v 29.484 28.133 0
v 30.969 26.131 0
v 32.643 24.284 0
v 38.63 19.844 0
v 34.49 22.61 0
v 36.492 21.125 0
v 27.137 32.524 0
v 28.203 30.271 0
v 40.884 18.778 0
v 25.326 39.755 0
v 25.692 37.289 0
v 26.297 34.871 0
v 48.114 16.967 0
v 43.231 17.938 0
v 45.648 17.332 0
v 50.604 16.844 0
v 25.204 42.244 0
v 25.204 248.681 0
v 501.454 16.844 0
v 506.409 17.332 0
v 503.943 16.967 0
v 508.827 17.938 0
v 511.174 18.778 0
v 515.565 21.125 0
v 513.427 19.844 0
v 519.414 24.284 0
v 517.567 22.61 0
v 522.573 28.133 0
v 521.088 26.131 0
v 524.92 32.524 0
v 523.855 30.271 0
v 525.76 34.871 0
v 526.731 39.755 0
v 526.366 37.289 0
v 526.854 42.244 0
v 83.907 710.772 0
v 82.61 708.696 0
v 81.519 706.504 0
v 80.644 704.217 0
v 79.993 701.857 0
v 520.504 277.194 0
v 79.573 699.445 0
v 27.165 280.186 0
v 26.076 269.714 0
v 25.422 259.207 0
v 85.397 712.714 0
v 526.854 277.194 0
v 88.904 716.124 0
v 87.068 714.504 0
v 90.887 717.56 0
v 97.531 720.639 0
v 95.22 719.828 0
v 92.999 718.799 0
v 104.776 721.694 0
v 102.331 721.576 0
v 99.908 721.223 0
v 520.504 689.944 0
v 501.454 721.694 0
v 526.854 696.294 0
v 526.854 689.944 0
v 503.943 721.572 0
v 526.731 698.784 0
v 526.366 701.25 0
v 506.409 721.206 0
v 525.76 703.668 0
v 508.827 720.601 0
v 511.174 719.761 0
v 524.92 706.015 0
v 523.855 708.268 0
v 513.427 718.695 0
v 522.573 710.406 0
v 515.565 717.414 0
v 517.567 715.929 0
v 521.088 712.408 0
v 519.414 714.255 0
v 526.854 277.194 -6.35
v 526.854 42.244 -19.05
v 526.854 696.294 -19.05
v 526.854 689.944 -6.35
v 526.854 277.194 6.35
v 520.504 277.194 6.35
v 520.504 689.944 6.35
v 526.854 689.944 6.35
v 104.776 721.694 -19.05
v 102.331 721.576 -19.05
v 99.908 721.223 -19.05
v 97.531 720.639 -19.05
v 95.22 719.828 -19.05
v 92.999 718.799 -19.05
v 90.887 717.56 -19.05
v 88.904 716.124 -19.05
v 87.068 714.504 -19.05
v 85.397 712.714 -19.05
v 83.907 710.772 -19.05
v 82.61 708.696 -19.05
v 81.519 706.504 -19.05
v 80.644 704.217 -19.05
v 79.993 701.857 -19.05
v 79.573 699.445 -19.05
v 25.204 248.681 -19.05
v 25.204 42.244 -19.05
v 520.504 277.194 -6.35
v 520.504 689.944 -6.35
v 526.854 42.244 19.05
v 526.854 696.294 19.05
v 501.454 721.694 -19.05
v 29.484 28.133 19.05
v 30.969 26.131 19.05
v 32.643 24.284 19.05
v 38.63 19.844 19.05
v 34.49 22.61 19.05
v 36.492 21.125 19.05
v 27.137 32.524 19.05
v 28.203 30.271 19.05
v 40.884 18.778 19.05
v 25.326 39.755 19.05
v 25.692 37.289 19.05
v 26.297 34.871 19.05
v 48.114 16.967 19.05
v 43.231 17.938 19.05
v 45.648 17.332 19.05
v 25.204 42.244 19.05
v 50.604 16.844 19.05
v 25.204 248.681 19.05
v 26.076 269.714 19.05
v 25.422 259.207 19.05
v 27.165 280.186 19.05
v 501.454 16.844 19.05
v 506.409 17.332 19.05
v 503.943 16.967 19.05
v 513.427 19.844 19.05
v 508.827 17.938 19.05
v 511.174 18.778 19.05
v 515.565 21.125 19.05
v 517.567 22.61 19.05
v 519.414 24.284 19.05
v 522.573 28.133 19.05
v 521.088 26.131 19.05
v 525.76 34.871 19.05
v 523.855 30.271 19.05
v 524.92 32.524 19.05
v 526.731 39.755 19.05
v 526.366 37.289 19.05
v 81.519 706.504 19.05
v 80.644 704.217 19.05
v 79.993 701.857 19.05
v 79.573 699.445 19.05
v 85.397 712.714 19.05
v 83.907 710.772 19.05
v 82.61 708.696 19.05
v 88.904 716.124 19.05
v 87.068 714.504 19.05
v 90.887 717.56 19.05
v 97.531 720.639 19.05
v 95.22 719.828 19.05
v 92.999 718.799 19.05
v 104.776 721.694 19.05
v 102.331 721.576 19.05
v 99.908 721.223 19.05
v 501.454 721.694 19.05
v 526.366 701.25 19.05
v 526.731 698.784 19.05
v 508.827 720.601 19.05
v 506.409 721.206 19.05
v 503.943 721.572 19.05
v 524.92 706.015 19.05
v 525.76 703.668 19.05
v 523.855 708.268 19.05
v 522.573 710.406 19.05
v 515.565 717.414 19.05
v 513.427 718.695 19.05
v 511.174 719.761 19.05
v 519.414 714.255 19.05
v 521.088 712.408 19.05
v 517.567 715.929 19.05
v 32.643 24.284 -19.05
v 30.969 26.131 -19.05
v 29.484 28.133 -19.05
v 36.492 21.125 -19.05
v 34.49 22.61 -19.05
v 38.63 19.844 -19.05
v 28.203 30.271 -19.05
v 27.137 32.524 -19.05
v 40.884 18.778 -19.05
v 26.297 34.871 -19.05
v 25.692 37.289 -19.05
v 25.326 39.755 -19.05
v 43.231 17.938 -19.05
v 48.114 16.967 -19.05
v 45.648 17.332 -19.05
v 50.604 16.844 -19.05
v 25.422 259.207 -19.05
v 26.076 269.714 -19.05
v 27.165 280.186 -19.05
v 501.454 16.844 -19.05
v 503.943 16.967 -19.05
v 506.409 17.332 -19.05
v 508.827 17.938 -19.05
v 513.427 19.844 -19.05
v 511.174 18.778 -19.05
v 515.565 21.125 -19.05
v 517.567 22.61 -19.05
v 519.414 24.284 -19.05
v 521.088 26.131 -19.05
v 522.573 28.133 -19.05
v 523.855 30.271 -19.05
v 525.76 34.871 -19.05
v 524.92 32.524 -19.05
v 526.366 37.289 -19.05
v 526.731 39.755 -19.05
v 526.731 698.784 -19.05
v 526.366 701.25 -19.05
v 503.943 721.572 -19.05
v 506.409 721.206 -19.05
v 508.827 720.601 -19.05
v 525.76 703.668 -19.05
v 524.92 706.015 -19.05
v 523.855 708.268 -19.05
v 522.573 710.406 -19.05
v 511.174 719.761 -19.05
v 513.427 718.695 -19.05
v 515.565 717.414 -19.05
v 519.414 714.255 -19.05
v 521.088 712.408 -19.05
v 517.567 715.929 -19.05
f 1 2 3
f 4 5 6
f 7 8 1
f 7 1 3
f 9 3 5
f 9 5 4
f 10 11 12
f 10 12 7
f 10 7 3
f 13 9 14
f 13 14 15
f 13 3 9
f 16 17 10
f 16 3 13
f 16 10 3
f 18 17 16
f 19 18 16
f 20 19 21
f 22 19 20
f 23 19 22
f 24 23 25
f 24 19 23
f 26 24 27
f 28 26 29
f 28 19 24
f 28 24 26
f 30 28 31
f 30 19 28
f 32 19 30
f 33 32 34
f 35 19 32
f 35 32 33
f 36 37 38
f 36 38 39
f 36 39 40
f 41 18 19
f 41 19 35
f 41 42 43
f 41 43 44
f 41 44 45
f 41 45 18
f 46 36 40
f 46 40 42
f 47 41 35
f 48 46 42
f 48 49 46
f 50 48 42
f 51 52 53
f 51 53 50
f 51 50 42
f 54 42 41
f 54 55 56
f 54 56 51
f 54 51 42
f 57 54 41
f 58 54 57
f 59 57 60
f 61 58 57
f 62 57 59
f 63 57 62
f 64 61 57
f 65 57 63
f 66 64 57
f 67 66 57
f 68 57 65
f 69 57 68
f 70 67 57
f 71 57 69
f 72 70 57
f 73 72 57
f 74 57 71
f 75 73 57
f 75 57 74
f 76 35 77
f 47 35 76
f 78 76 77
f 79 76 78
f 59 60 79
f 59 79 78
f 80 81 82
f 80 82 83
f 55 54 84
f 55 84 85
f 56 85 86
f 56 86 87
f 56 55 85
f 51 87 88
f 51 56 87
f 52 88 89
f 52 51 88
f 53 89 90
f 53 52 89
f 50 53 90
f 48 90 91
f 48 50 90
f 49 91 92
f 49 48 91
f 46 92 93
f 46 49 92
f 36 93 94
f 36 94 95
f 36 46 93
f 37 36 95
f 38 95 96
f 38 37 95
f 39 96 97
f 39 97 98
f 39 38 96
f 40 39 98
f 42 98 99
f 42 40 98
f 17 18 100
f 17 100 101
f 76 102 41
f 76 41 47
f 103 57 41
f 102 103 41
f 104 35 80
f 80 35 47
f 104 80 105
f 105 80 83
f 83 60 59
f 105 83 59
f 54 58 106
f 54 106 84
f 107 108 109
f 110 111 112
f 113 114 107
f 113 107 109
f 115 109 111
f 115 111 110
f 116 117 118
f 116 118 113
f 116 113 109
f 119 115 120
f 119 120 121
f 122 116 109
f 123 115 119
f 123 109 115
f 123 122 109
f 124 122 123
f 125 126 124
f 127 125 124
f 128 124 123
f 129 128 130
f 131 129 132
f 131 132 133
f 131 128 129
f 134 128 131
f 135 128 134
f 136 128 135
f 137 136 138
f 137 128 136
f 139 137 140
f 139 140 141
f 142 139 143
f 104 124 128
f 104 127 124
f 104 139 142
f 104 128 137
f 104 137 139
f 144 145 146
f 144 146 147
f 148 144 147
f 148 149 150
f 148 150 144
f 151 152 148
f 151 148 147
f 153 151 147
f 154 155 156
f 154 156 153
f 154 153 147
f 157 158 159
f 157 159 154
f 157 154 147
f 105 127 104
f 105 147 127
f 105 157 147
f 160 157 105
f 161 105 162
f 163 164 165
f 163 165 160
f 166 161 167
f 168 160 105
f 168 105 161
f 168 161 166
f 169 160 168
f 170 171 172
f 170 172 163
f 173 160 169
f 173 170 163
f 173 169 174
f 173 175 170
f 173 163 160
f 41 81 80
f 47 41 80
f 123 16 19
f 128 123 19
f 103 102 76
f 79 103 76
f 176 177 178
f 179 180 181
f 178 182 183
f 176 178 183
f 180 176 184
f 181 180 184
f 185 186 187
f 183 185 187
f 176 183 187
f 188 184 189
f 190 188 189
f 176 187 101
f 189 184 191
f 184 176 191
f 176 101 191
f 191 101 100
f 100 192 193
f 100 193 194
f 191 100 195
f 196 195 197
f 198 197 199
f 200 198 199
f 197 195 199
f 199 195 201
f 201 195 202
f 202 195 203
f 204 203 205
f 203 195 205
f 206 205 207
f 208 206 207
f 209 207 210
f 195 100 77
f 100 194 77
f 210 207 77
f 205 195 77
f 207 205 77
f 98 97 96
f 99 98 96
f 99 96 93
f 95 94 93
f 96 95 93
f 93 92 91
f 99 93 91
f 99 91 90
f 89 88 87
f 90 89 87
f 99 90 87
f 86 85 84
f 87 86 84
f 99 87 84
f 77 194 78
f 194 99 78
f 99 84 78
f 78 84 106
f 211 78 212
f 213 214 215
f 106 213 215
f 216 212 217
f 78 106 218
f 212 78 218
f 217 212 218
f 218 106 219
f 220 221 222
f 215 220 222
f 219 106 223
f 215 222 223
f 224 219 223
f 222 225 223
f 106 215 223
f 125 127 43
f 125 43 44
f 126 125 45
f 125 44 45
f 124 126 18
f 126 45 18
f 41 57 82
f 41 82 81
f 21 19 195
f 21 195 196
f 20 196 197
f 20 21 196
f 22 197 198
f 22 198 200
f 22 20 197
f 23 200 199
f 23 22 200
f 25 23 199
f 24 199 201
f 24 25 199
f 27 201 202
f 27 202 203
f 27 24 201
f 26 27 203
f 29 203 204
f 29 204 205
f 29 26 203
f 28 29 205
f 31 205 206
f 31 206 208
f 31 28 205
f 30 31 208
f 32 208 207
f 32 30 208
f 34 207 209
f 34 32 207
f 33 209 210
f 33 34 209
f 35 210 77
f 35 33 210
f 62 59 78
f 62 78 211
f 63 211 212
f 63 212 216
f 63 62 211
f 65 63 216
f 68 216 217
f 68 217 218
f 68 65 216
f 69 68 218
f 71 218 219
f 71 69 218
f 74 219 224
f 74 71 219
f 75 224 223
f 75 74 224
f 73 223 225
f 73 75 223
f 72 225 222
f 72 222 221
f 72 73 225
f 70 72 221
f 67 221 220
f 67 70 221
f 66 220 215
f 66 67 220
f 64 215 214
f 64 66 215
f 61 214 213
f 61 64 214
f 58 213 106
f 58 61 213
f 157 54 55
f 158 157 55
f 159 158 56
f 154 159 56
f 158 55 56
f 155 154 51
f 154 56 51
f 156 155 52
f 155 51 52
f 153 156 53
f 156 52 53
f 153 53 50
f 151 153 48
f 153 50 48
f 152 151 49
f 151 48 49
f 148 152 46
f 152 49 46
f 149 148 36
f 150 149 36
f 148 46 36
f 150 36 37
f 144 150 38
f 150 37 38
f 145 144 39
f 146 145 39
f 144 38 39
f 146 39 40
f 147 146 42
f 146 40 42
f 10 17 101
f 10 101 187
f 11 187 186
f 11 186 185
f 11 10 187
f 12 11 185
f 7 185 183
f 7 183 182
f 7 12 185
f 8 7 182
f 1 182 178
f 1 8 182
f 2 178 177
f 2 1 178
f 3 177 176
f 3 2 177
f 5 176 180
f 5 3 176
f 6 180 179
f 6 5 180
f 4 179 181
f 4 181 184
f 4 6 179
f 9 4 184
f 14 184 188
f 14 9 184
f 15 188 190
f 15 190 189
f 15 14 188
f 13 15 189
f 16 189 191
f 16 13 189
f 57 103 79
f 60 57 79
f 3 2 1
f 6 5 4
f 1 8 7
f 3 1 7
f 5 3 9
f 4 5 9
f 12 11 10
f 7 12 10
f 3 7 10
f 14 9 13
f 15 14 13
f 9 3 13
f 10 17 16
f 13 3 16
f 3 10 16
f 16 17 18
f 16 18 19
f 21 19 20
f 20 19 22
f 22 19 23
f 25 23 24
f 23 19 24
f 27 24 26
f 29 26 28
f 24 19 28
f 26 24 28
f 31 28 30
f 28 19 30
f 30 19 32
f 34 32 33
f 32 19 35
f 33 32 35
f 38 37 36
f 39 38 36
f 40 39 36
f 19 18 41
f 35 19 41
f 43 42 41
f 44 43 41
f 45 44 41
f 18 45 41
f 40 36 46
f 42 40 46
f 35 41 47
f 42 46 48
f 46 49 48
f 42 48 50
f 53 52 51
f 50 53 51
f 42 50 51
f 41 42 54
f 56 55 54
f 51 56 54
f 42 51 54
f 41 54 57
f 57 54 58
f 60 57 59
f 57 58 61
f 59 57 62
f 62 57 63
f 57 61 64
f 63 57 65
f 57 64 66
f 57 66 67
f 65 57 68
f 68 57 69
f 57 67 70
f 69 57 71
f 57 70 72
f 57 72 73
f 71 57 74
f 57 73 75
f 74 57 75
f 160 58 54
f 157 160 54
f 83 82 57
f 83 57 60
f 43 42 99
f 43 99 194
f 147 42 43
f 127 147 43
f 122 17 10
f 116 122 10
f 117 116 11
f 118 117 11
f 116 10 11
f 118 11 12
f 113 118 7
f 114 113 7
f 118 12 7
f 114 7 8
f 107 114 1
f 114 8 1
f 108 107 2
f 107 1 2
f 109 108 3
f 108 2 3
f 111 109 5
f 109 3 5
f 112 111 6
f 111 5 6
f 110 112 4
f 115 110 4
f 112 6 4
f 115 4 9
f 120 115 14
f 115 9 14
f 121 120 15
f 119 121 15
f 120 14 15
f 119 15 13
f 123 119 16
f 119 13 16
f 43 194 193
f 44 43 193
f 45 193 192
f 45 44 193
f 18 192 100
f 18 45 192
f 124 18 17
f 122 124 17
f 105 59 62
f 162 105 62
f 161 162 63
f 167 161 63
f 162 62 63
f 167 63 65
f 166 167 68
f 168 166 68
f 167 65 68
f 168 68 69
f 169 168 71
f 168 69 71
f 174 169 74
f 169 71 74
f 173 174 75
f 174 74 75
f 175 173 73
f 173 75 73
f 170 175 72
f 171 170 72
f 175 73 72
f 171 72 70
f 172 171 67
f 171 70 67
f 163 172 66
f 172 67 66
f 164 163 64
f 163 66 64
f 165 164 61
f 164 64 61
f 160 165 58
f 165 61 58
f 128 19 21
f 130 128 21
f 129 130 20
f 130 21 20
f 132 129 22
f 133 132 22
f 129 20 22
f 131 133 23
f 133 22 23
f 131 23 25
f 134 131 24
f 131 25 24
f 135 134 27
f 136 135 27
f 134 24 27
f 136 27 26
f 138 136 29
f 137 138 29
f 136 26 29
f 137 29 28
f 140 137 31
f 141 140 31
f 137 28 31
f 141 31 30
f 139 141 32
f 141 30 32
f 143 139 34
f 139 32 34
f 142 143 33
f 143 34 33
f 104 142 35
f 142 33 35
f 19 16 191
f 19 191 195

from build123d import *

# Parameters (mm, degrees)
F1_DEPTH = 19.05
F2_W     = 6.35
F2_H     = 412.75
F3_DEPTH = 6.35


with BuildPart() as f1:
    # F0 (on Top) → F1 (new body)
    with BuildSketch(Plane.XY):
        with BuildLine():
            ThreePointArc((25.20377, 42.244397), (32.643258, 24.283885), (50.60377, 16.844397))
            Line((50.60377, 16.844397), (501.45377, 16.844397))
            ThreePointArc((501.45377, 16.844397), (519.414282, 24.283885), (526.85377, 42.244397))
            Line((526.85377, 42.244397), (526.85377, 696.294397))
            ThreePointArc((526.85377, 696.294397), (519.414282, 714.25491), (501.45377, 721.694397))
            Line((501.45377, 721.694397), (104.776438, 721.694397))
            ThreePointArc((104.776438, 721.694397), (87.966653, 715.336223), (79.57258, 699.44488))
            Line((79.57258, 699.44488), (27.165189, 280.185752))
            ThreePointArc((27.165189, 280.185752), (25.694599, 264.463839), (25.20377, 248.680929))
            Line((25.20377, 248.680929), (25.20377, 42.244397))
        make_face()
    extrude(amount=F1_DEPTH)

    # F2 (on face) → F3 (cut)
    with BuildSketch(Plane(origin=(0, 0, 0), x_dir=(1, 0, 0), z_dir=(0, 0, -1))):
        with Locations((523.67877, -483.569397)):
            Rectangle(F2_W, F2_H)
    extrude(amount=-F3_DEPTH, mode=Mode.SUBTRACT)


with BuildPart() as f4_1:
    # F4: instance of F1
    add(f1.part.mirror(Plane.XY))


solid = Compound([f1.part, f4_1.part])
